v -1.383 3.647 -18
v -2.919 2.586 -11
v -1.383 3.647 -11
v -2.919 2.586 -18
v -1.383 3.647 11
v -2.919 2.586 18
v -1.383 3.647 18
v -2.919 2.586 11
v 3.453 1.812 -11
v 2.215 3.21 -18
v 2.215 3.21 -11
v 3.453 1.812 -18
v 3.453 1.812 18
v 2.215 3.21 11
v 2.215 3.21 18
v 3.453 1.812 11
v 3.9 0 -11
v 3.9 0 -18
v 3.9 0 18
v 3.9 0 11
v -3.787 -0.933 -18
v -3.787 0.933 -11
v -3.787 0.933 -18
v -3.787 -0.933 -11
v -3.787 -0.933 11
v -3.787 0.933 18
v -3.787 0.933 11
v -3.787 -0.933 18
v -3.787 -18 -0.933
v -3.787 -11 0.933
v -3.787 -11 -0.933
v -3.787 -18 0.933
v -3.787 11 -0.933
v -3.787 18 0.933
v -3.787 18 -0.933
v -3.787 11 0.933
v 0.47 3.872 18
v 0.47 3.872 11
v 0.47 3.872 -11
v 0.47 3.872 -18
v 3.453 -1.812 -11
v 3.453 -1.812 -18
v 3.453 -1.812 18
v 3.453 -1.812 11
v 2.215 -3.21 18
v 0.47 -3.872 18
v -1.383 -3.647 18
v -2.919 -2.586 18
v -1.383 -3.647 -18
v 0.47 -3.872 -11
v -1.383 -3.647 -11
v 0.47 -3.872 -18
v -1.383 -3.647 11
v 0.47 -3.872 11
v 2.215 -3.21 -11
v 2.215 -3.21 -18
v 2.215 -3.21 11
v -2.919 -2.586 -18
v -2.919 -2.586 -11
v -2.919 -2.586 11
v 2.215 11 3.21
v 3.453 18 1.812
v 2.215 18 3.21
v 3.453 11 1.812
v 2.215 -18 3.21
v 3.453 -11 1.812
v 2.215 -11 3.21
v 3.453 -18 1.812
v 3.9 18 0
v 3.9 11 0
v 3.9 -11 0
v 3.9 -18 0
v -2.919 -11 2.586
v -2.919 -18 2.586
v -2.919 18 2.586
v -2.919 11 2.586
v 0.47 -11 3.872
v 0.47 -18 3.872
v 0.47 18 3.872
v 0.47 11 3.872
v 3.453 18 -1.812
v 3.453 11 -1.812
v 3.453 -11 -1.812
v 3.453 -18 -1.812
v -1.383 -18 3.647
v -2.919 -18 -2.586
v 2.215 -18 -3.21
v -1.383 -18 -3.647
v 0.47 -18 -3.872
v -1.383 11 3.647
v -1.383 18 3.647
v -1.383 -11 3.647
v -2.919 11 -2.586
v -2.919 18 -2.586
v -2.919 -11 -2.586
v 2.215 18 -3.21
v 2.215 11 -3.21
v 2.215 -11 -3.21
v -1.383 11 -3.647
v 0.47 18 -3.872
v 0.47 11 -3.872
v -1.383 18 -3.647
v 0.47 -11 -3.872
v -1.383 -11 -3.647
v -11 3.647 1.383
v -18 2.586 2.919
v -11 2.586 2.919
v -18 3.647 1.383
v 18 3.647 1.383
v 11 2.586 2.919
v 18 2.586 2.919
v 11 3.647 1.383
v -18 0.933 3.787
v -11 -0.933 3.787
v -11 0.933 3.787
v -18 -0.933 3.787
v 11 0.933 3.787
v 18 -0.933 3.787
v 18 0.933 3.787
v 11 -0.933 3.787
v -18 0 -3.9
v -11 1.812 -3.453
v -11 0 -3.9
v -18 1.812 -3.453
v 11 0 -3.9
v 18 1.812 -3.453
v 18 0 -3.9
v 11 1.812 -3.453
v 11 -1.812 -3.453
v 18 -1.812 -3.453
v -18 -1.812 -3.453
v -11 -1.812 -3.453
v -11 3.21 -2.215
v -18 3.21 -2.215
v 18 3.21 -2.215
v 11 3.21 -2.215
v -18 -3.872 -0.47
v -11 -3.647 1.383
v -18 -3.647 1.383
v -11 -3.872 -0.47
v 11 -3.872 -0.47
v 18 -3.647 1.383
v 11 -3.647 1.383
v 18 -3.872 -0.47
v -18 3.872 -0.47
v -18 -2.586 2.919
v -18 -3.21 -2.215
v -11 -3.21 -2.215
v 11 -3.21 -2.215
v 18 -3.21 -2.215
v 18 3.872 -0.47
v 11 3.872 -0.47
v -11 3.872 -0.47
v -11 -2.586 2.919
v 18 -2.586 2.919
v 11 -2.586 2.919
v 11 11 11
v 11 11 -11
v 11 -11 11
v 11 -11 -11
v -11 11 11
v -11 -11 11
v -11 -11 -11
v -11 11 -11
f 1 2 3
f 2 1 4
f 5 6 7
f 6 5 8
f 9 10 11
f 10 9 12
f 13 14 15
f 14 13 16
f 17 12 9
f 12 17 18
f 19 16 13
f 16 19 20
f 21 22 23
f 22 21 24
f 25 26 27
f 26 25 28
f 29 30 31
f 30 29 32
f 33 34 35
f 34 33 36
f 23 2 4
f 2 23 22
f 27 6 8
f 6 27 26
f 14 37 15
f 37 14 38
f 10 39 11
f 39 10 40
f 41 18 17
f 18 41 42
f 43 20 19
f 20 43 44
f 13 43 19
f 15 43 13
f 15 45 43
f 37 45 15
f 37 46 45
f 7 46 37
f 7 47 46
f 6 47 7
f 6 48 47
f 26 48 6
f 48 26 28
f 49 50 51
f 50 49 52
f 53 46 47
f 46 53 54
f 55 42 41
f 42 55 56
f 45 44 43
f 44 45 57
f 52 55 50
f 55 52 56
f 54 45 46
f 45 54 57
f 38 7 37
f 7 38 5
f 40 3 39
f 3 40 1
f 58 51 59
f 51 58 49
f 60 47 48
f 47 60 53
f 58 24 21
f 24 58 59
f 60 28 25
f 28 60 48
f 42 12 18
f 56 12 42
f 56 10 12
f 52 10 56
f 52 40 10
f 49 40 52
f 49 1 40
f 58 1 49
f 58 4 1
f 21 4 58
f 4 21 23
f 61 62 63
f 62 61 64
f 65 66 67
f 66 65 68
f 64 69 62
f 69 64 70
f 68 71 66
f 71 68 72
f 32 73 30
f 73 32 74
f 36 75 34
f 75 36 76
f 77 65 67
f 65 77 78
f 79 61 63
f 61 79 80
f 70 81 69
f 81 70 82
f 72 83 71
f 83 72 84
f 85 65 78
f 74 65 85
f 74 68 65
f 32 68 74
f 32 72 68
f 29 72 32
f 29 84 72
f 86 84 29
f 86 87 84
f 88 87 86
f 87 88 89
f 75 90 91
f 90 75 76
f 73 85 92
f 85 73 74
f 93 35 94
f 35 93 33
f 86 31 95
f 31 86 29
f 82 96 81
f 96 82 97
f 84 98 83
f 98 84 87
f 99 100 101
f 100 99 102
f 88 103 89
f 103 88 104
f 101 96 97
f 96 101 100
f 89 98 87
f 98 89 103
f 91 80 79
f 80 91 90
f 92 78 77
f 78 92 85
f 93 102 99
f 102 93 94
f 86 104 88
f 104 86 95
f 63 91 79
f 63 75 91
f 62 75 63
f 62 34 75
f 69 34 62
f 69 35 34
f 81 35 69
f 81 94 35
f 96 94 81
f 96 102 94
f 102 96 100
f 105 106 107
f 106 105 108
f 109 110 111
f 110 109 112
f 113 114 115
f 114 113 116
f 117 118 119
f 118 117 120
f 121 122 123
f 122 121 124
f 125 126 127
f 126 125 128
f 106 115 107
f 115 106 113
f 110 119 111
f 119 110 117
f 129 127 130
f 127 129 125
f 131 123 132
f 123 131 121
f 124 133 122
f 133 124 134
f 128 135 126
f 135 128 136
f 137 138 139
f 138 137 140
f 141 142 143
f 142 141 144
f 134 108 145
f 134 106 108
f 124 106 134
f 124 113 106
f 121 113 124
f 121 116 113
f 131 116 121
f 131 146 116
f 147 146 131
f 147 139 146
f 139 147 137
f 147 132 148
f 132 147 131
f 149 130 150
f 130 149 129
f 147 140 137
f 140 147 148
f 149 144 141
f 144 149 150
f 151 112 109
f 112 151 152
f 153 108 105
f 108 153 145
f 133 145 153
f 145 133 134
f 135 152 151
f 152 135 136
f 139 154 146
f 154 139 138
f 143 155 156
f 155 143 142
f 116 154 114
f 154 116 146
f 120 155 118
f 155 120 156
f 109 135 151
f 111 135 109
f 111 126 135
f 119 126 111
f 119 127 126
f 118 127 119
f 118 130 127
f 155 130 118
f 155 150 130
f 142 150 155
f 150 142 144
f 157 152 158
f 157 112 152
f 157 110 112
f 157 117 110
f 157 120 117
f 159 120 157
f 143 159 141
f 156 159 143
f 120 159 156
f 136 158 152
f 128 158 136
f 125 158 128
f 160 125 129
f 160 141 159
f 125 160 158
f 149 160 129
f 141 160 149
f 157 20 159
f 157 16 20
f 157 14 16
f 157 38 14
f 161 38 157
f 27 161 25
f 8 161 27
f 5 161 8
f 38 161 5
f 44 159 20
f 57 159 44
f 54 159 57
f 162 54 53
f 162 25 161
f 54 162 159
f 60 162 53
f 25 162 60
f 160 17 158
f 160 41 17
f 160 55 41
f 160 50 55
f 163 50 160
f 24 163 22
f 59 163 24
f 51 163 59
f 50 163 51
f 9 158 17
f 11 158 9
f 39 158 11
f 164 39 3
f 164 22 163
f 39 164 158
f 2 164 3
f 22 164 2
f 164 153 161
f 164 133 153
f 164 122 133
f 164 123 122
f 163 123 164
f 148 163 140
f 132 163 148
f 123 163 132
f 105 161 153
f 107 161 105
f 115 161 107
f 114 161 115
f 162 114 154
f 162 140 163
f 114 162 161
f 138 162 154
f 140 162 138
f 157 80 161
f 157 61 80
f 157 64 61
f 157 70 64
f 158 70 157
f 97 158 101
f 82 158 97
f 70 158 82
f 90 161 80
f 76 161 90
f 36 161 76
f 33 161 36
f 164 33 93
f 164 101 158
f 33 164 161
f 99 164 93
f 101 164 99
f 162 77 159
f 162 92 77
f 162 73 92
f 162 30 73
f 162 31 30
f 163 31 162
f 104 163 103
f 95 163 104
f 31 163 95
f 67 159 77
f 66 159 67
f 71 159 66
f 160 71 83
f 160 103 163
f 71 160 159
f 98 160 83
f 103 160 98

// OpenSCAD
inner_r = 8/2;
outer_r = 22/2;
bearing_t = 7;

center_h = 2 * (outer_r + bearing_t);

eps = 0.1;

for (rot = [[0, 0, 0], [90, 0, 0], [0, 90, 0]]){
    rotate(rot)
    translate([0, 0, -center_h/2])
    cylinder(center_h, inner_r-eps, inner_r-eps);
}

cube([2*outer_r, 2*outer_r, 2*outer_r], center=true);
